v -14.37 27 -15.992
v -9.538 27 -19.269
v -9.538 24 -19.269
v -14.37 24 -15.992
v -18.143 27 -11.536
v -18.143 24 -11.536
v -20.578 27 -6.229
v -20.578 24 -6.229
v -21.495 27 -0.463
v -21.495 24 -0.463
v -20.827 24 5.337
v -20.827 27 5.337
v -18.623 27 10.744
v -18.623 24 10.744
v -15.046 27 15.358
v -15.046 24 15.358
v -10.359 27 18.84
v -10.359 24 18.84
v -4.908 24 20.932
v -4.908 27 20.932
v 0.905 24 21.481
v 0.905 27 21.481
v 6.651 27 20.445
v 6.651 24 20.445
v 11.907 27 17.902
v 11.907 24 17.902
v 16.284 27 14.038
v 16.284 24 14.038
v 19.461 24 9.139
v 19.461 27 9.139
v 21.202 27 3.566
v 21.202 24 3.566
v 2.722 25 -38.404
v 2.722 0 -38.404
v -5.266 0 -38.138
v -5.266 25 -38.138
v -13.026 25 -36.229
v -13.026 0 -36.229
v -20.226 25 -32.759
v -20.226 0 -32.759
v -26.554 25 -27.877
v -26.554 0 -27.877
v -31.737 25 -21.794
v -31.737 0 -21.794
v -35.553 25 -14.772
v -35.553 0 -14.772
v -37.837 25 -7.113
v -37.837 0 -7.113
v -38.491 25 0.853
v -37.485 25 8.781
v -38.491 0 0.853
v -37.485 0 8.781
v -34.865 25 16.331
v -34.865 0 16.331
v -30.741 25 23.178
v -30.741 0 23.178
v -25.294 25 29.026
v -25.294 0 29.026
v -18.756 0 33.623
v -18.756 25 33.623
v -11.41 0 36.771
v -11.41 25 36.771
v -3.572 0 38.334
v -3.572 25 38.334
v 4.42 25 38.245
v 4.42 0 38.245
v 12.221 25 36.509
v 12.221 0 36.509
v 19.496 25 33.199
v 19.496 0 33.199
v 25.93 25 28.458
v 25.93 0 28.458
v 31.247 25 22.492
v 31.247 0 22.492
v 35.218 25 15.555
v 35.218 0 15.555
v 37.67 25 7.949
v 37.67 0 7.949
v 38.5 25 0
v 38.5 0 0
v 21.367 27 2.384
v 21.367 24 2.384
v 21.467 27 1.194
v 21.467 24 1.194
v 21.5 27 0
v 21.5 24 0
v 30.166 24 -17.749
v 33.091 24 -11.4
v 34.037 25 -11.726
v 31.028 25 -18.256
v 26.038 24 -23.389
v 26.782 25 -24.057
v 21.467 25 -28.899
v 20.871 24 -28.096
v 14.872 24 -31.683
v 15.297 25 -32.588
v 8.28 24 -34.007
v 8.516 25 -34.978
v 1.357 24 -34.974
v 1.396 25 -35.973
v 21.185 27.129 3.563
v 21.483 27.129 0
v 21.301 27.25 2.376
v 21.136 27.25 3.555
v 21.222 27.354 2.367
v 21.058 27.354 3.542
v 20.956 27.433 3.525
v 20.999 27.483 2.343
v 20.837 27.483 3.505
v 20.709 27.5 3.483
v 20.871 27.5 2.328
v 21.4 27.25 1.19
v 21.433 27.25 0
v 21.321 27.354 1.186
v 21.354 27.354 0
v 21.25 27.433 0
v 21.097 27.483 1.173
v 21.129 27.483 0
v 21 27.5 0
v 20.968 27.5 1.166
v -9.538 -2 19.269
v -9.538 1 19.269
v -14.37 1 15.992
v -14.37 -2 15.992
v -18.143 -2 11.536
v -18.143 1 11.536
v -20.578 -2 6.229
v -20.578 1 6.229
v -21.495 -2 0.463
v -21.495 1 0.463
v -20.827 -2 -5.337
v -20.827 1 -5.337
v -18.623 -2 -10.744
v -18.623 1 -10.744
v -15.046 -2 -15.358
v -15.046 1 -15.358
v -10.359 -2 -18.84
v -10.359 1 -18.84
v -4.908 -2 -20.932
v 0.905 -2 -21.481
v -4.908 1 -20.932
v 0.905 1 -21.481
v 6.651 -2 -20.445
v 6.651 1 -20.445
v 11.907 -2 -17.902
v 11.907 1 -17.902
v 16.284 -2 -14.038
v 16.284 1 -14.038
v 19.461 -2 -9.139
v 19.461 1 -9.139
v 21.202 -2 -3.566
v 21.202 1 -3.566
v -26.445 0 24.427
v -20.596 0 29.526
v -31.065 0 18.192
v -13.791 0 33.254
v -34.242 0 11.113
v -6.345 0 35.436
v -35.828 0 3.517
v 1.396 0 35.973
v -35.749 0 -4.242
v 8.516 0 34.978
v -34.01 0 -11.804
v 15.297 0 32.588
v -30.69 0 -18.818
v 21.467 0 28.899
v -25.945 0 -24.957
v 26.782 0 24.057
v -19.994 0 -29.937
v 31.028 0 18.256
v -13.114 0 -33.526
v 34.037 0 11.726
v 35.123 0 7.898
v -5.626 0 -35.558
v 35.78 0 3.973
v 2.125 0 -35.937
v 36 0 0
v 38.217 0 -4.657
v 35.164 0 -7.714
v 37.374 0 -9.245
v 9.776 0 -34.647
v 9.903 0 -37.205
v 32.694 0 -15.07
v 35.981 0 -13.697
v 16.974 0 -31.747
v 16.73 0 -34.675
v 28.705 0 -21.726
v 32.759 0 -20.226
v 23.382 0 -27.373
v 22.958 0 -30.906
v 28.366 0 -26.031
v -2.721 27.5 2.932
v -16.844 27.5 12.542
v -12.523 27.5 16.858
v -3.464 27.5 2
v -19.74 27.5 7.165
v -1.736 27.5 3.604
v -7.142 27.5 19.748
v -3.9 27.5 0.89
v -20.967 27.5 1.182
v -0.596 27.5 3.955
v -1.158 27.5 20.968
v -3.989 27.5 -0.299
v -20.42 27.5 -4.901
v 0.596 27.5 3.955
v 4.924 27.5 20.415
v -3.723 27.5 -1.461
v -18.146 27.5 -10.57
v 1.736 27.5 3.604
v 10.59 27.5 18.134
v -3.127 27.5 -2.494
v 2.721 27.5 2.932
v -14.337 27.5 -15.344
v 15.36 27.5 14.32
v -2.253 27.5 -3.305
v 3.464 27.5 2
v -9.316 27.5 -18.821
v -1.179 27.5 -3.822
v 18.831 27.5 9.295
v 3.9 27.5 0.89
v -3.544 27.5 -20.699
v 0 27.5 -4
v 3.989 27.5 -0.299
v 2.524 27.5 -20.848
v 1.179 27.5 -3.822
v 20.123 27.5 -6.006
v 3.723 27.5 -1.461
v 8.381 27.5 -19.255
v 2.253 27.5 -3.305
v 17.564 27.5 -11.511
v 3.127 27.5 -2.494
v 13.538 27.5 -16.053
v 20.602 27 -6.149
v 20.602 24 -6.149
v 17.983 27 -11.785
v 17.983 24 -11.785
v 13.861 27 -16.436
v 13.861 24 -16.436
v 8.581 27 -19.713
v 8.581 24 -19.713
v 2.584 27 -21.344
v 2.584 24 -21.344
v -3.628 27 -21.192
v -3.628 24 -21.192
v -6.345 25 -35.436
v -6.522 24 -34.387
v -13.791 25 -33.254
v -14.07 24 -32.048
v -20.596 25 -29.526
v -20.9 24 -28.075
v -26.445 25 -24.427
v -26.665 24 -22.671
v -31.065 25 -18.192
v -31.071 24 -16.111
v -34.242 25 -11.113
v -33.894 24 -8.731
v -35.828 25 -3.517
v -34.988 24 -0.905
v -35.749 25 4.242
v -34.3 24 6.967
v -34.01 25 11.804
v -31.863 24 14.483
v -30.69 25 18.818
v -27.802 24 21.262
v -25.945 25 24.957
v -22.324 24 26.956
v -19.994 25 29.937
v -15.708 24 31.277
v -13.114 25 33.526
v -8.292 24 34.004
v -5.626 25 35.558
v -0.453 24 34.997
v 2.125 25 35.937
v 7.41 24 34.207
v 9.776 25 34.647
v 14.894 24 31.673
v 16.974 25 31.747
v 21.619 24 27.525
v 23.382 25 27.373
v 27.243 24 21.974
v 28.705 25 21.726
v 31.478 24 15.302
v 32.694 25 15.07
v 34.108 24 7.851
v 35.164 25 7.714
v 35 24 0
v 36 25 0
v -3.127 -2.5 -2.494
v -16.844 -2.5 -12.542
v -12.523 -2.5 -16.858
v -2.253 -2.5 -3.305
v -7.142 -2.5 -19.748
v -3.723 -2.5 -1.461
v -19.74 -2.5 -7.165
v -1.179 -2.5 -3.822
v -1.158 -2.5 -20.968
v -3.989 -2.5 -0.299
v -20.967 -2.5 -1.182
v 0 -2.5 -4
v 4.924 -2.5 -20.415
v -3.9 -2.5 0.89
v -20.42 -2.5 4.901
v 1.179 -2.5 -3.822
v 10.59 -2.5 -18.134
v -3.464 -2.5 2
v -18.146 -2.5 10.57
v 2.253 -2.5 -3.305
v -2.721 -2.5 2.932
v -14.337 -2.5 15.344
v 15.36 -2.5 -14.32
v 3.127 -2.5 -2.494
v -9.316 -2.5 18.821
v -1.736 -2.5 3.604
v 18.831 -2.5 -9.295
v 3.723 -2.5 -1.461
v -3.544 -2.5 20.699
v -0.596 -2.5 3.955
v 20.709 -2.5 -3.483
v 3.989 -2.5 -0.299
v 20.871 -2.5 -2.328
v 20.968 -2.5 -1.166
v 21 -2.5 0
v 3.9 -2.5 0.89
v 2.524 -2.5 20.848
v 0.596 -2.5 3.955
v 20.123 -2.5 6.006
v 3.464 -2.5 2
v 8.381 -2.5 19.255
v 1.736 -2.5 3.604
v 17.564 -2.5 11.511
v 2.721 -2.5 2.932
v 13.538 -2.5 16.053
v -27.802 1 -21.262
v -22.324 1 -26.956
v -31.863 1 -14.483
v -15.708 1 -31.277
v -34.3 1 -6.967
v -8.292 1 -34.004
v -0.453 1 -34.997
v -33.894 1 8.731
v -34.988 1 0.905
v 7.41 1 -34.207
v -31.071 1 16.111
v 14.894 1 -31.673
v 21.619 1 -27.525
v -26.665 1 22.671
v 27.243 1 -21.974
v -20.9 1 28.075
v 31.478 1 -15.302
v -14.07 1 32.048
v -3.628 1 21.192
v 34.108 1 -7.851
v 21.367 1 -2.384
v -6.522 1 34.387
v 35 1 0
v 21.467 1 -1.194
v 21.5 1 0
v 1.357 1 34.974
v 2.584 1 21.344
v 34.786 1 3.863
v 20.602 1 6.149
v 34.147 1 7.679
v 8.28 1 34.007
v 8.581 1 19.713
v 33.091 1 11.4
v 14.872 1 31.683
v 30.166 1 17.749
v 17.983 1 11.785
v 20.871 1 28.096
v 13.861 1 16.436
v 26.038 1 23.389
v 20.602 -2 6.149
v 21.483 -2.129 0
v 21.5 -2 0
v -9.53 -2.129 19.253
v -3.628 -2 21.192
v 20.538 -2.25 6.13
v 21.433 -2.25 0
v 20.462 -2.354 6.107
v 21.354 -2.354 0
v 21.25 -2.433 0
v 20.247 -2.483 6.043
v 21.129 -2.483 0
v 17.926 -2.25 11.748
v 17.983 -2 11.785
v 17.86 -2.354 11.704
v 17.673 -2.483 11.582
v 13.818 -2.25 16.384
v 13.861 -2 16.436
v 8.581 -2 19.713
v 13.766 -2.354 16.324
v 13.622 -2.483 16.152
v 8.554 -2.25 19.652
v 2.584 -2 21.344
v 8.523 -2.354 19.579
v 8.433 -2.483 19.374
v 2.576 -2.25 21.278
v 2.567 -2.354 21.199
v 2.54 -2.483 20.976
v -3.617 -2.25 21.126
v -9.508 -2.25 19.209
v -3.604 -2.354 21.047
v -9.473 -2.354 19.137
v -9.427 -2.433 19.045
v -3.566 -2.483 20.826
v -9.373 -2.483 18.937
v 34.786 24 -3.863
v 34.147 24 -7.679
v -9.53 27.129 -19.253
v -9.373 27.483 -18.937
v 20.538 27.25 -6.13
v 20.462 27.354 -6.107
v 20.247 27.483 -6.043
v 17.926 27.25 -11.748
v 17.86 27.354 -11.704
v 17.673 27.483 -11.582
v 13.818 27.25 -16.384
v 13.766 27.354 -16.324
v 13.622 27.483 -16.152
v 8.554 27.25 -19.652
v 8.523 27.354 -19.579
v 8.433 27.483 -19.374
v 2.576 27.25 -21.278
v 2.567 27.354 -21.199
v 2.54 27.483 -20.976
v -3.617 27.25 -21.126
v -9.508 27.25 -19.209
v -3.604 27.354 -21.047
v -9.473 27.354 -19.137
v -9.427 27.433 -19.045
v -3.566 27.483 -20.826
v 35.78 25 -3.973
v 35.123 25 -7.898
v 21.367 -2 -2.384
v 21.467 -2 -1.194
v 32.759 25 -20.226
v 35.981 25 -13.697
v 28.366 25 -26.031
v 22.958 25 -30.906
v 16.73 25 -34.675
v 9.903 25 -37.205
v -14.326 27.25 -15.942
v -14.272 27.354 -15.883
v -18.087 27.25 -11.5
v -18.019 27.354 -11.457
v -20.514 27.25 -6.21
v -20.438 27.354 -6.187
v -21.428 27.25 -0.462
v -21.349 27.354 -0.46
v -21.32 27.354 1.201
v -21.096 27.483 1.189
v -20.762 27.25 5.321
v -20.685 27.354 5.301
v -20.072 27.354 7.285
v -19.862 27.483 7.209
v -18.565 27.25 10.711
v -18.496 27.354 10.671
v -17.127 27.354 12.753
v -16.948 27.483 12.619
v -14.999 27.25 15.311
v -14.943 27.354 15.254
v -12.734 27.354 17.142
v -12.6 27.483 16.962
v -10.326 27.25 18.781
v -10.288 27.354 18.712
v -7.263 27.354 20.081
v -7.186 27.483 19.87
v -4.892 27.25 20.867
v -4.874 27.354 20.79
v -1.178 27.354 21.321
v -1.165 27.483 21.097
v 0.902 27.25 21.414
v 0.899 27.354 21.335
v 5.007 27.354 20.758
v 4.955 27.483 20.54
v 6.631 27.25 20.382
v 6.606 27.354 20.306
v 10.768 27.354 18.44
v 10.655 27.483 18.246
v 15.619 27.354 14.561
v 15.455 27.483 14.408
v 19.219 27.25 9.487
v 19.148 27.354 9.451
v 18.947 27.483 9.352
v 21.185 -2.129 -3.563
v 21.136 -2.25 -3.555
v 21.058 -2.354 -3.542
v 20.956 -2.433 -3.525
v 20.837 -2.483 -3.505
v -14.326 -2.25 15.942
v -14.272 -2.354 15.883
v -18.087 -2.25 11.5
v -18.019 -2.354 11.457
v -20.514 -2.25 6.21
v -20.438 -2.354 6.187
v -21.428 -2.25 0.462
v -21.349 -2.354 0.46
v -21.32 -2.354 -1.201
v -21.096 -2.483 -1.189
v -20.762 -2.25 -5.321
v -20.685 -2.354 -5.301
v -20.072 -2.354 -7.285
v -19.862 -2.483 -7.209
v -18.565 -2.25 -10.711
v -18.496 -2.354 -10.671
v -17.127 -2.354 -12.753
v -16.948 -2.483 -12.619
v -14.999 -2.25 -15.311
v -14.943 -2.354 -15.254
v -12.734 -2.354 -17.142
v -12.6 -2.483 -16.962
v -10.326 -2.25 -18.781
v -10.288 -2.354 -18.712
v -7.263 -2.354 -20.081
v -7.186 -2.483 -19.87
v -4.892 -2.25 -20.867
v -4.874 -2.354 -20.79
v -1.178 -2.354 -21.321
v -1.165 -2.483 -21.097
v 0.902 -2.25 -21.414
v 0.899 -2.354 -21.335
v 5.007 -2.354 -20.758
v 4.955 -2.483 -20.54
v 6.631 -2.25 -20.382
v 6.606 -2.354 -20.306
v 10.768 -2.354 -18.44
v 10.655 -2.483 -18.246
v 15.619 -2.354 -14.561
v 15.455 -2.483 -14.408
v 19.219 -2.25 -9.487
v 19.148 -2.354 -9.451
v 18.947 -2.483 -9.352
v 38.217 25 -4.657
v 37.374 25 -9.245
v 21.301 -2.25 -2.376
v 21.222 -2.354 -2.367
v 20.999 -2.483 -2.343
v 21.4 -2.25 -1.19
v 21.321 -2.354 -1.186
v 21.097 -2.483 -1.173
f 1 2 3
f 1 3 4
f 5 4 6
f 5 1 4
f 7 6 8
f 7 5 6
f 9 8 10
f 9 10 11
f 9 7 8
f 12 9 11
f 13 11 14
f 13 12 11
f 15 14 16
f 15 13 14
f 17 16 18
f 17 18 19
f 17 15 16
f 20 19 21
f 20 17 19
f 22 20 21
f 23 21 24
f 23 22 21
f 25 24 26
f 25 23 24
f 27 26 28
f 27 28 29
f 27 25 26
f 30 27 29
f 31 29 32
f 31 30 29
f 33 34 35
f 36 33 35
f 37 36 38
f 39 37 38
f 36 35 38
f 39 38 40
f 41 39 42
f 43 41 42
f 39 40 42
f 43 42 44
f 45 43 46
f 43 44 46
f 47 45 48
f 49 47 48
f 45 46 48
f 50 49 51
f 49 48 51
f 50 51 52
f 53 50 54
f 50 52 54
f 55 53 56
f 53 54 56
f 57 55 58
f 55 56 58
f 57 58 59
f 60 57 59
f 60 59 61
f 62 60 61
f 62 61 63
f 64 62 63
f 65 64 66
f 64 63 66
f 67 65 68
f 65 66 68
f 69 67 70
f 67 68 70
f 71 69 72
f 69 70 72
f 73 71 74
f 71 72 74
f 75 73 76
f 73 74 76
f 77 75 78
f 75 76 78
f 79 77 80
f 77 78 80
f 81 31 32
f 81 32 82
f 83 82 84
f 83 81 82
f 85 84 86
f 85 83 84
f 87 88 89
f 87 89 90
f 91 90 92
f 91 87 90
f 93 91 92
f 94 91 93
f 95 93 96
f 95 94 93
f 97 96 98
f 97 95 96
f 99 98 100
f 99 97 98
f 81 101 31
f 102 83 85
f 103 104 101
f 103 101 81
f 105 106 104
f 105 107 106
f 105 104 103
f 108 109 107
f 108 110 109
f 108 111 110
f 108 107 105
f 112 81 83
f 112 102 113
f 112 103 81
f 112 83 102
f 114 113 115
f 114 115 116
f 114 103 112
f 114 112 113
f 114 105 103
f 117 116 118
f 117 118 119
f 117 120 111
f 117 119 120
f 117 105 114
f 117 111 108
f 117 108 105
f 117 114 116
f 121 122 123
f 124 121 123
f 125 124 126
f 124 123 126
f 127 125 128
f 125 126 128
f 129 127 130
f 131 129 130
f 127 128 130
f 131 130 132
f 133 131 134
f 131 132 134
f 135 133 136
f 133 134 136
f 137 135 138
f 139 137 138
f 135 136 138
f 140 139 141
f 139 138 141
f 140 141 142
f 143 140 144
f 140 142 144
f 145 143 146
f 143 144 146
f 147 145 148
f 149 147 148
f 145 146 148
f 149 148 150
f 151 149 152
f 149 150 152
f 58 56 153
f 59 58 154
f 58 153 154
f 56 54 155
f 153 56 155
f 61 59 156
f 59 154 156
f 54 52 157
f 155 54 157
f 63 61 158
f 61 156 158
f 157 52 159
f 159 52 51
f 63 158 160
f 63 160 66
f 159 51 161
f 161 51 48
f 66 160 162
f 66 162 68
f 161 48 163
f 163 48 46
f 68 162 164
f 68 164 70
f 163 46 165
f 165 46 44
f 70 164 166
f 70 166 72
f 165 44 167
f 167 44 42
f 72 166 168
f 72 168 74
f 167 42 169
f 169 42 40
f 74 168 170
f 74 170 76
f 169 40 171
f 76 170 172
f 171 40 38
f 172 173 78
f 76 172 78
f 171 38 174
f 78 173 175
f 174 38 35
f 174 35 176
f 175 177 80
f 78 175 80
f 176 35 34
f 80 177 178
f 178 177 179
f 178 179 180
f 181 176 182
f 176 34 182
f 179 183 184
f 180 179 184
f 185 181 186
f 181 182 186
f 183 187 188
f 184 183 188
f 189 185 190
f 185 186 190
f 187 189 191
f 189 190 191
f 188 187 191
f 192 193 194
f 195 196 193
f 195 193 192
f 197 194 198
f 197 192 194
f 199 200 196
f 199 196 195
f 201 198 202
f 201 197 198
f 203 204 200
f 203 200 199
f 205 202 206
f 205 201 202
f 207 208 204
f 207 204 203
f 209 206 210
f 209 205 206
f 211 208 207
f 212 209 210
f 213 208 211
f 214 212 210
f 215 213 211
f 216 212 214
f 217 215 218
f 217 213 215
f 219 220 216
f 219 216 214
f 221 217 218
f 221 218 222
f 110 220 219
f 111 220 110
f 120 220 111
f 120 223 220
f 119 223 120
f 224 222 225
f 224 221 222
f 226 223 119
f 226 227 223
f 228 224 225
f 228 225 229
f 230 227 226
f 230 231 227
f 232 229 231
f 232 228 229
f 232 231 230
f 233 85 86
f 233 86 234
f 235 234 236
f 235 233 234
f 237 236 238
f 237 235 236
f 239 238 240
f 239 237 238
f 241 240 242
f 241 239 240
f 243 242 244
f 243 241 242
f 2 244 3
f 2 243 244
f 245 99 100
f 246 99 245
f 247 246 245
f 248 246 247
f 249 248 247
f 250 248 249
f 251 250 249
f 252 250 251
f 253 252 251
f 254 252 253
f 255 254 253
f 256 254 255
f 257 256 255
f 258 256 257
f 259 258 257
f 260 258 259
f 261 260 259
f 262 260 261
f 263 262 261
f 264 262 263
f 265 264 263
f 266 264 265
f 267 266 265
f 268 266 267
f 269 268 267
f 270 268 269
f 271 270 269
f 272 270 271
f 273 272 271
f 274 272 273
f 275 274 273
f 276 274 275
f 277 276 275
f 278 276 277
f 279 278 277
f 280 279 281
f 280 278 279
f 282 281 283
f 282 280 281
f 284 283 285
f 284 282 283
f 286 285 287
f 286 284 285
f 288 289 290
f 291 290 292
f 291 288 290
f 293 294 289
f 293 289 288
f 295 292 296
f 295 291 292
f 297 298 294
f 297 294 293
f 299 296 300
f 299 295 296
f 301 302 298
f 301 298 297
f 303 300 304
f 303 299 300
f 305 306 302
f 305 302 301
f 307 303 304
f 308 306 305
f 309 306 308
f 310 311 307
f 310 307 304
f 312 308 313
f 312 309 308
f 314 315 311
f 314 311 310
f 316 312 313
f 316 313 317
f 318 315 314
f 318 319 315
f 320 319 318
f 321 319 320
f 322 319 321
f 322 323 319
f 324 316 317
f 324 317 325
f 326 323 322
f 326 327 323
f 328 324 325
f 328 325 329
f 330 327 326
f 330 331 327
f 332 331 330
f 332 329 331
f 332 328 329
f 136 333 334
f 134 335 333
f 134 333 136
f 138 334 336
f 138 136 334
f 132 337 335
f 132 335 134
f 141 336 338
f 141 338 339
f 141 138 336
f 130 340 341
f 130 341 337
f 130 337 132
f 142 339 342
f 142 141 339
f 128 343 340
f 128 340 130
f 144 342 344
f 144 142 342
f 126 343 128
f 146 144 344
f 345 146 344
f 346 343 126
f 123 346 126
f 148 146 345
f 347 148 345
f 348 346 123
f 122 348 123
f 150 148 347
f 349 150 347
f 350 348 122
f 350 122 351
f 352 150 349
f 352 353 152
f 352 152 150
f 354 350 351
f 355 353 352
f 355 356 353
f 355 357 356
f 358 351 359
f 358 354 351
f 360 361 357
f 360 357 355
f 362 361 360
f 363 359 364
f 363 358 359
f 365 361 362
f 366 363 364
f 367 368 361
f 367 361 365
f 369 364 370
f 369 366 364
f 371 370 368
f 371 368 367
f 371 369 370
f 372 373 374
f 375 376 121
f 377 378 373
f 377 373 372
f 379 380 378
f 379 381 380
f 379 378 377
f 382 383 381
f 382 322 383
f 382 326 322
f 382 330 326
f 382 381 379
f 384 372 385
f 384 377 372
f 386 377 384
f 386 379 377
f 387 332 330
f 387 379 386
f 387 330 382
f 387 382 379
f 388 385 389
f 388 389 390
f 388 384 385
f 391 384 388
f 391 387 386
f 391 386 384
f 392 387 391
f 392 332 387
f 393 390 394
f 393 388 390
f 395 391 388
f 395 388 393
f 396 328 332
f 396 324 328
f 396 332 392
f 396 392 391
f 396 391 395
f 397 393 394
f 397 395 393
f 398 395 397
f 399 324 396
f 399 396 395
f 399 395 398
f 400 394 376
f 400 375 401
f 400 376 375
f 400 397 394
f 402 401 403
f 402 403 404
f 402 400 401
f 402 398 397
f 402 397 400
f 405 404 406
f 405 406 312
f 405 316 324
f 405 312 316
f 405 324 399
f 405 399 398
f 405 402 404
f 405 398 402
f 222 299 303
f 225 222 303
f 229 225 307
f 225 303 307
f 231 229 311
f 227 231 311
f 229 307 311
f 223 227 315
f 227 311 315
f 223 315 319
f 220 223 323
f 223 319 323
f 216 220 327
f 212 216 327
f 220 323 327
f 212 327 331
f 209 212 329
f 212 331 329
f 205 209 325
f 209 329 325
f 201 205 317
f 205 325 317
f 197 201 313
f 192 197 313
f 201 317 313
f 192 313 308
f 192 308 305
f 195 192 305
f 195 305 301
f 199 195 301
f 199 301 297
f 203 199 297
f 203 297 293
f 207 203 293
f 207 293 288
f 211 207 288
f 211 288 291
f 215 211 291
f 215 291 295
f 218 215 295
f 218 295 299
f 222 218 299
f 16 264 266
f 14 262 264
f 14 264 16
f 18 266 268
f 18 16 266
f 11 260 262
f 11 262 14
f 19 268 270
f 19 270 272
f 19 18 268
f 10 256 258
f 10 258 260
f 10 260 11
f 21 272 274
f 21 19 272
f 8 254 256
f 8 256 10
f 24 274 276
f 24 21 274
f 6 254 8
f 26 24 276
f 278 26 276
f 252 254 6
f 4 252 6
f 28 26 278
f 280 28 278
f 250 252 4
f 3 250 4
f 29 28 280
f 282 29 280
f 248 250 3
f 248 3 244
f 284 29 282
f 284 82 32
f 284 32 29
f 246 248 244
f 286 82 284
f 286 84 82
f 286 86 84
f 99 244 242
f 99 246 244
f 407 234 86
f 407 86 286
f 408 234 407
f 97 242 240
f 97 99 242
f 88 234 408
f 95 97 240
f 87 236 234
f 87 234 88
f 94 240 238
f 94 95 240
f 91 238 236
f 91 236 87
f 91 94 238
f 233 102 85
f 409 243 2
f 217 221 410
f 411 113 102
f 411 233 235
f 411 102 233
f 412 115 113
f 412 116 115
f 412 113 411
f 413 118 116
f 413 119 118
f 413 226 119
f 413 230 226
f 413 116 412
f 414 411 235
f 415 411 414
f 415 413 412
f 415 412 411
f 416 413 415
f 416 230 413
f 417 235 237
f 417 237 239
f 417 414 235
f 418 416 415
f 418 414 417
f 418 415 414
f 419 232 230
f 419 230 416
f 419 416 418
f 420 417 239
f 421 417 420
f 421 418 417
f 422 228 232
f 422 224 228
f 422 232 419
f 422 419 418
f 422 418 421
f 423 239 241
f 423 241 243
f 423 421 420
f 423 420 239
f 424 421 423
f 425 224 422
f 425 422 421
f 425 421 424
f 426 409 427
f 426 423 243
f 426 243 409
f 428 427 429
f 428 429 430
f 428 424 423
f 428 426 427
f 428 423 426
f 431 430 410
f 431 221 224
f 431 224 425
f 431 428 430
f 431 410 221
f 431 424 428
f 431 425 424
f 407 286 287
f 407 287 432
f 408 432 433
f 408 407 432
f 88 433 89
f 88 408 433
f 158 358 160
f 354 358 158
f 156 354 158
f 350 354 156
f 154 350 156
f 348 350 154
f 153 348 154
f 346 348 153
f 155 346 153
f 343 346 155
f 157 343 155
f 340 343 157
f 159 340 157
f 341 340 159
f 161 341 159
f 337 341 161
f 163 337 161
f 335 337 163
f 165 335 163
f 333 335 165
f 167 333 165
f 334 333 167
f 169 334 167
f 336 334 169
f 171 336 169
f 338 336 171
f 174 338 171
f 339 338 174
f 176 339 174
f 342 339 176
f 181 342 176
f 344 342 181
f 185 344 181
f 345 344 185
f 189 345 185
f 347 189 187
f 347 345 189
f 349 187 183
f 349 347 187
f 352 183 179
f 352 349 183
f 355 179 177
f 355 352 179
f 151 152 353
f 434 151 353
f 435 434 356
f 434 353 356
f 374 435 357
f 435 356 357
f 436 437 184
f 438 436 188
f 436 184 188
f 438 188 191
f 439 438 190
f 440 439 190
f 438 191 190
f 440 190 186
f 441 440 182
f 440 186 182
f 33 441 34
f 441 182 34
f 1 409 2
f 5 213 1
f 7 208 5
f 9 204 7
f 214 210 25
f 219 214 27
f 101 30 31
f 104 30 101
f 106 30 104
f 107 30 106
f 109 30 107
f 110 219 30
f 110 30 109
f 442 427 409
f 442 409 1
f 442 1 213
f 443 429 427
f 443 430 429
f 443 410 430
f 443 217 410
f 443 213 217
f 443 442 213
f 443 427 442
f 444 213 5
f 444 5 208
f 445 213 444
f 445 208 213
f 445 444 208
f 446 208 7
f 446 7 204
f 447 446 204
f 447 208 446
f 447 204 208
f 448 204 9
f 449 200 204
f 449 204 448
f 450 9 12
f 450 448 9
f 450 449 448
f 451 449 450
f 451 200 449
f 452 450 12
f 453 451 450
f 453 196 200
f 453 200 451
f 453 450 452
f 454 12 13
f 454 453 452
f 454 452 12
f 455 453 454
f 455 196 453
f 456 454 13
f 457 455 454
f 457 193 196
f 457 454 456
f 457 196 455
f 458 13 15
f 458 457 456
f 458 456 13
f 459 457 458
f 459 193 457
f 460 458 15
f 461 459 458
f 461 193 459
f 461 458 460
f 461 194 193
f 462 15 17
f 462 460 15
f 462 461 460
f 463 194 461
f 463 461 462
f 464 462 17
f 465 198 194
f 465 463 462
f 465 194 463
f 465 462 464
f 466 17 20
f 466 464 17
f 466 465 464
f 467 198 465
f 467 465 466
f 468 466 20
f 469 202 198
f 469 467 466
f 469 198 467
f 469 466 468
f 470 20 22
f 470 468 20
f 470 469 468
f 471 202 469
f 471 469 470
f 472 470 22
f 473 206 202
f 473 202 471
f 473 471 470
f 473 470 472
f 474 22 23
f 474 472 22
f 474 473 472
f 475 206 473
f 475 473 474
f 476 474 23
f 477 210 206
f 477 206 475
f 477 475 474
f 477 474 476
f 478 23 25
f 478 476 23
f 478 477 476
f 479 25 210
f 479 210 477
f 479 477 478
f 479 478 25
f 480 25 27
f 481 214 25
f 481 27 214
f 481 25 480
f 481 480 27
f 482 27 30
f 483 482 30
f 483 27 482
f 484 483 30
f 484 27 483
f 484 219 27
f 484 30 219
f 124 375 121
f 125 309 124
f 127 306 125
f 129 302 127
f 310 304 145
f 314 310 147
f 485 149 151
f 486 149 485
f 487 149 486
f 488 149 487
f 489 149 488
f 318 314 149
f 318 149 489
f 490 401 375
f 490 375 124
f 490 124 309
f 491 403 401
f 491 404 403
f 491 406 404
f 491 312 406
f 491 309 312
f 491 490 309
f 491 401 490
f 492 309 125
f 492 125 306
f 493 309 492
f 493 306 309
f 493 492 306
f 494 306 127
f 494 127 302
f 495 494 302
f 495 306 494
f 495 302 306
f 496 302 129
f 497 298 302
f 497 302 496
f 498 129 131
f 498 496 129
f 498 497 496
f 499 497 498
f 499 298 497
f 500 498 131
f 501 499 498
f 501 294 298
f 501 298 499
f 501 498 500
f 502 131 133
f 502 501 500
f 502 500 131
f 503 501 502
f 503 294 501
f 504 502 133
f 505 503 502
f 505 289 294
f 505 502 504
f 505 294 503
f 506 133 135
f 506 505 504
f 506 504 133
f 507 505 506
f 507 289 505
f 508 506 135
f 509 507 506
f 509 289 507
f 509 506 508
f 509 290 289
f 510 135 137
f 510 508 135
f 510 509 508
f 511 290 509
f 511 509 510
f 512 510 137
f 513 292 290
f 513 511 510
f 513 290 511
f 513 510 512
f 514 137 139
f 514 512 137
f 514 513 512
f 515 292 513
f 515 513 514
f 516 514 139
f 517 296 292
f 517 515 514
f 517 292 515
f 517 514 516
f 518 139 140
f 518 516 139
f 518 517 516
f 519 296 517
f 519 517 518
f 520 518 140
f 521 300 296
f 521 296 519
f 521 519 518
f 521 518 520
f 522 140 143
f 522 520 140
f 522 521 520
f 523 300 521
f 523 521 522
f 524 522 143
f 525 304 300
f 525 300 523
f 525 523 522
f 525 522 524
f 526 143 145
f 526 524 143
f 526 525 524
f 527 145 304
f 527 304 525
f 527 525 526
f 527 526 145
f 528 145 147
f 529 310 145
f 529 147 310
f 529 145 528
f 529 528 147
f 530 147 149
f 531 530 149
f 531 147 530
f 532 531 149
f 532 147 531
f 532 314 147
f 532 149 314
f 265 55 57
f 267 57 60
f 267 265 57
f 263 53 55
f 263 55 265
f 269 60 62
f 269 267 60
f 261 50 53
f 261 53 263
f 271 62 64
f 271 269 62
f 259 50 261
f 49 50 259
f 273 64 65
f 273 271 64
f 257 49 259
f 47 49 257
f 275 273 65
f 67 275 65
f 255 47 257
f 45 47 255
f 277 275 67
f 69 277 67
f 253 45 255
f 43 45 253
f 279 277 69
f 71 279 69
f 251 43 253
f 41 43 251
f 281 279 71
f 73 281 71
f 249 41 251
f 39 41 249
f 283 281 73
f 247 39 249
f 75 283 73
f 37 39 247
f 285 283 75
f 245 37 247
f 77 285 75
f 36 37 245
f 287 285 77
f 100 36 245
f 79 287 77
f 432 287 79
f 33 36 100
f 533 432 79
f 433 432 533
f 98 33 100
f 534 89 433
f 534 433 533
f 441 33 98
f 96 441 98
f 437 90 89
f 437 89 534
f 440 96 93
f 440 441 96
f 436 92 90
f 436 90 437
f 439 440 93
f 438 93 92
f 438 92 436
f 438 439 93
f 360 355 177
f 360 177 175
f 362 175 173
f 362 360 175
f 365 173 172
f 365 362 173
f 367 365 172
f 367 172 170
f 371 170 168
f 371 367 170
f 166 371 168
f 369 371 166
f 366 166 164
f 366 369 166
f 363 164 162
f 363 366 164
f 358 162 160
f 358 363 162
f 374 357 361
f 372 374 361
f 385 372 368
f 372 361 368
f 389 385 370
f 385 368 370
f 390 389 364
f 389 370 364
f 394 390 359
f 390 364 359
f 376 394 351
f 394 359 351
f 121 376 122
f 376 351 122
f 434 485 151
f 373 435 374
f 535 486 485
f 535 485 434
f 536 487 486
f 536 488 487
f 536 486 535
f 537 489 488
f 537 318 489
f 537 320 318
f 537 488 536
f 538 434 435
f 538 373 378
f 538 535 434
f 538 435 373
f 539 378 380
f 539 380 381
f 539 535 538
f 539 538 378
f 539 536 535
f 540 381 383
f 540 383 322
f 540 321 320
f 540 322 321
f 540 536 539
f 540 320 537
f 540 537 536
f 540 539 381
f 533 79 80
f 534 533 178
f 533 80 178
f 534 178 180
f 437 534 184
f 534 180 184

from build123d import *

# Parameters (mm, degrees)
EXTRUDE_1_DEPTH     = 25
CUT_EXTRUDE_3_DEPTH = 1
CUT_EXTRUDE_START   = -1
CUT_EXTRUDE_4_DEPTH = 1
CHAMFER_1_SIZE      = 1
EXTRUDE_2_DEPTH     = 3.5
EXTRUDE_START       = 3.5
EXTRUDE_3_DEPTH     = 3.5
FILLET_1_R          = 0.5
SKETCH_6_R          = 4
CUT_EXTRUDE_5_DEPTH = 63.165102751


with BuildPart() as part:
    # ｽｹｯﾁ1 → ﾎﾞｽ - 押し出し1 (new body)
    with BuildSketch(Plane(origin=(0, 0, 0), x_dir=(1, 0, 0), z_dir=(0, 1, 0))):
        with BuildLine():
            ThreePointArc((35.980947353, 13.697497128), (22.958239241, 30.905812576), (2.722143787, 38.403644791))
            ThreePointArc((2.722143787, 38.403644791), (-28.169598292, -26.243546485), (38.5, 0))
            ThreePointArc((38.5, 0), (37.865000153, 6.963602764), (35.980947353, 13.697497128))
        make_face()
    extrude(amount=EXTRUDE_1_DEPTH)

    # ｽｹｯﾁ2 → ｶｯﾄ - 押し出し3 (cut)
    with BuildSketch(Plane(origin=(0, 25, 0), x_dir=(1, 0, 0), z_dir=(0, 1, 0))):
        with BuildLine():
            ThreePointArc((34.036718994, 11.726114452), (21.467444485, 28.898941629), (1.396281143, 35.972912017))
            ThreePointArc((1.396281143, 35.972912017), (-25.94480797, -24.957302327), (36, 0))
            ThreePointArc((36, 0), (35.505787442, 5.944666358), (34.036718994, 11.726114452))
        make_face()
    extrude(amount=-CUT_EXTRUDE_3_DEPTH, mode=Mode.SUBTRACT)

    # ｽｹｯﾁ3 → ｶｯﾄ - 押し出し4 (cut)
    with BuildSketch(Plane.XZ.offset(CUT_EXTRUDE_START)):
        with BuildLine():
            ThreePointArc((34.036718994, 11.726114452), (21.467444485, 28.898941629), (1.396281143, 35.972912017))
            ThreePointArc((1.396281143, 35.972912017), (-25.94480797, -24.957302327), (36, 0))
            ThreePointArc((36, 0), (35.505787442, 5.944666358), (34.036718994, 11.726114452))
        make_face()
    extrude(amount=CUT_EXTRUDE_4_DEPTH, mode=Mode.SUBTRACT)

    # 面取り1
    chamfer_1_edges = [part.edges().sort_by_distance(p)[0] for p in [
        (-36, 1, 0),
        (-36, 24, 0),
    ]]
    chamfer(chamfer_1_edges, length=CHAMFER_1_SIZE - 0.0001)  # a hair under: the kernel refuses the full size

    # ｽｹｯﾁ4 → ﾎﾞｽ - 押し出し2 (add)
    with BuildSketch(Plane.XZ.offset(-1)):
        with BuildLine():
            ThreePointArc((21.5, 0), (11.339952646, 18.266238638), (-9.537718509, 19.268677319))
            ThreePointArc((-9.537718509, 19.268677319), (-12.820834901, -17.25909014), (21.202158445, -3.566297417))
            ThreePointArc((21.202158445, -3.566297417), (21.425410224, -1.789356508), (21.5, 0))
        make_face()
    extrude(amount=EXTRUDE_2_DEPTH)

    # ｽｹｯﾁ5 → ﾎﾞｽ - 押し出し3 (add)
    with BuildSketch(Plane(origin=(0, 24, 0), x_dir=(1, 0, 0), z_dir=(0, 1, 0)).offset(EXTRUDE_START)):
        with BuildLine():
            ThreePointArc((21.5, 0), (11.339952646, 18.266238638), (-9.537718509, 19.268677319))
            ThreePointArc((-9.537718509, 19.268677319), (-12.820834901, -17.25909014), (21.202158445, -3.566297417))
            ThreePointArc((21.202158445, -3.566297417), (21.425410224, -1.789356508), (21.5, 0))
        make_face()
    extrude(amount=-EXTRUDE_3_DEPTH)

    # ﾌｨﾚｯﾄ1
    fillet_1_edges = [part.edges().sort_by_distance(p)[0] for p in [
        (-21.202158445, -2.5, 3.566297417),
        (-21.202158445, 27.5, -3.566297417),
    ]]
    fillet(fillet_1_edges, radius=FILLET_1_R)

    # ｽｹｯﾁ6 → ｶｯﾄ - 押し出し5 (cut, through all)
    with BuildSketch(Plane.XZ.offset(2.5)):
        with Locations(Location((0, 0, 0), (0, 0, 270))):
            Circle(SKETCH_6_R)
    extrude(amount=-CUT_EXTRUDE_5_DEPTH, mode=Mode.SUBTRACT)


solid = part.part
